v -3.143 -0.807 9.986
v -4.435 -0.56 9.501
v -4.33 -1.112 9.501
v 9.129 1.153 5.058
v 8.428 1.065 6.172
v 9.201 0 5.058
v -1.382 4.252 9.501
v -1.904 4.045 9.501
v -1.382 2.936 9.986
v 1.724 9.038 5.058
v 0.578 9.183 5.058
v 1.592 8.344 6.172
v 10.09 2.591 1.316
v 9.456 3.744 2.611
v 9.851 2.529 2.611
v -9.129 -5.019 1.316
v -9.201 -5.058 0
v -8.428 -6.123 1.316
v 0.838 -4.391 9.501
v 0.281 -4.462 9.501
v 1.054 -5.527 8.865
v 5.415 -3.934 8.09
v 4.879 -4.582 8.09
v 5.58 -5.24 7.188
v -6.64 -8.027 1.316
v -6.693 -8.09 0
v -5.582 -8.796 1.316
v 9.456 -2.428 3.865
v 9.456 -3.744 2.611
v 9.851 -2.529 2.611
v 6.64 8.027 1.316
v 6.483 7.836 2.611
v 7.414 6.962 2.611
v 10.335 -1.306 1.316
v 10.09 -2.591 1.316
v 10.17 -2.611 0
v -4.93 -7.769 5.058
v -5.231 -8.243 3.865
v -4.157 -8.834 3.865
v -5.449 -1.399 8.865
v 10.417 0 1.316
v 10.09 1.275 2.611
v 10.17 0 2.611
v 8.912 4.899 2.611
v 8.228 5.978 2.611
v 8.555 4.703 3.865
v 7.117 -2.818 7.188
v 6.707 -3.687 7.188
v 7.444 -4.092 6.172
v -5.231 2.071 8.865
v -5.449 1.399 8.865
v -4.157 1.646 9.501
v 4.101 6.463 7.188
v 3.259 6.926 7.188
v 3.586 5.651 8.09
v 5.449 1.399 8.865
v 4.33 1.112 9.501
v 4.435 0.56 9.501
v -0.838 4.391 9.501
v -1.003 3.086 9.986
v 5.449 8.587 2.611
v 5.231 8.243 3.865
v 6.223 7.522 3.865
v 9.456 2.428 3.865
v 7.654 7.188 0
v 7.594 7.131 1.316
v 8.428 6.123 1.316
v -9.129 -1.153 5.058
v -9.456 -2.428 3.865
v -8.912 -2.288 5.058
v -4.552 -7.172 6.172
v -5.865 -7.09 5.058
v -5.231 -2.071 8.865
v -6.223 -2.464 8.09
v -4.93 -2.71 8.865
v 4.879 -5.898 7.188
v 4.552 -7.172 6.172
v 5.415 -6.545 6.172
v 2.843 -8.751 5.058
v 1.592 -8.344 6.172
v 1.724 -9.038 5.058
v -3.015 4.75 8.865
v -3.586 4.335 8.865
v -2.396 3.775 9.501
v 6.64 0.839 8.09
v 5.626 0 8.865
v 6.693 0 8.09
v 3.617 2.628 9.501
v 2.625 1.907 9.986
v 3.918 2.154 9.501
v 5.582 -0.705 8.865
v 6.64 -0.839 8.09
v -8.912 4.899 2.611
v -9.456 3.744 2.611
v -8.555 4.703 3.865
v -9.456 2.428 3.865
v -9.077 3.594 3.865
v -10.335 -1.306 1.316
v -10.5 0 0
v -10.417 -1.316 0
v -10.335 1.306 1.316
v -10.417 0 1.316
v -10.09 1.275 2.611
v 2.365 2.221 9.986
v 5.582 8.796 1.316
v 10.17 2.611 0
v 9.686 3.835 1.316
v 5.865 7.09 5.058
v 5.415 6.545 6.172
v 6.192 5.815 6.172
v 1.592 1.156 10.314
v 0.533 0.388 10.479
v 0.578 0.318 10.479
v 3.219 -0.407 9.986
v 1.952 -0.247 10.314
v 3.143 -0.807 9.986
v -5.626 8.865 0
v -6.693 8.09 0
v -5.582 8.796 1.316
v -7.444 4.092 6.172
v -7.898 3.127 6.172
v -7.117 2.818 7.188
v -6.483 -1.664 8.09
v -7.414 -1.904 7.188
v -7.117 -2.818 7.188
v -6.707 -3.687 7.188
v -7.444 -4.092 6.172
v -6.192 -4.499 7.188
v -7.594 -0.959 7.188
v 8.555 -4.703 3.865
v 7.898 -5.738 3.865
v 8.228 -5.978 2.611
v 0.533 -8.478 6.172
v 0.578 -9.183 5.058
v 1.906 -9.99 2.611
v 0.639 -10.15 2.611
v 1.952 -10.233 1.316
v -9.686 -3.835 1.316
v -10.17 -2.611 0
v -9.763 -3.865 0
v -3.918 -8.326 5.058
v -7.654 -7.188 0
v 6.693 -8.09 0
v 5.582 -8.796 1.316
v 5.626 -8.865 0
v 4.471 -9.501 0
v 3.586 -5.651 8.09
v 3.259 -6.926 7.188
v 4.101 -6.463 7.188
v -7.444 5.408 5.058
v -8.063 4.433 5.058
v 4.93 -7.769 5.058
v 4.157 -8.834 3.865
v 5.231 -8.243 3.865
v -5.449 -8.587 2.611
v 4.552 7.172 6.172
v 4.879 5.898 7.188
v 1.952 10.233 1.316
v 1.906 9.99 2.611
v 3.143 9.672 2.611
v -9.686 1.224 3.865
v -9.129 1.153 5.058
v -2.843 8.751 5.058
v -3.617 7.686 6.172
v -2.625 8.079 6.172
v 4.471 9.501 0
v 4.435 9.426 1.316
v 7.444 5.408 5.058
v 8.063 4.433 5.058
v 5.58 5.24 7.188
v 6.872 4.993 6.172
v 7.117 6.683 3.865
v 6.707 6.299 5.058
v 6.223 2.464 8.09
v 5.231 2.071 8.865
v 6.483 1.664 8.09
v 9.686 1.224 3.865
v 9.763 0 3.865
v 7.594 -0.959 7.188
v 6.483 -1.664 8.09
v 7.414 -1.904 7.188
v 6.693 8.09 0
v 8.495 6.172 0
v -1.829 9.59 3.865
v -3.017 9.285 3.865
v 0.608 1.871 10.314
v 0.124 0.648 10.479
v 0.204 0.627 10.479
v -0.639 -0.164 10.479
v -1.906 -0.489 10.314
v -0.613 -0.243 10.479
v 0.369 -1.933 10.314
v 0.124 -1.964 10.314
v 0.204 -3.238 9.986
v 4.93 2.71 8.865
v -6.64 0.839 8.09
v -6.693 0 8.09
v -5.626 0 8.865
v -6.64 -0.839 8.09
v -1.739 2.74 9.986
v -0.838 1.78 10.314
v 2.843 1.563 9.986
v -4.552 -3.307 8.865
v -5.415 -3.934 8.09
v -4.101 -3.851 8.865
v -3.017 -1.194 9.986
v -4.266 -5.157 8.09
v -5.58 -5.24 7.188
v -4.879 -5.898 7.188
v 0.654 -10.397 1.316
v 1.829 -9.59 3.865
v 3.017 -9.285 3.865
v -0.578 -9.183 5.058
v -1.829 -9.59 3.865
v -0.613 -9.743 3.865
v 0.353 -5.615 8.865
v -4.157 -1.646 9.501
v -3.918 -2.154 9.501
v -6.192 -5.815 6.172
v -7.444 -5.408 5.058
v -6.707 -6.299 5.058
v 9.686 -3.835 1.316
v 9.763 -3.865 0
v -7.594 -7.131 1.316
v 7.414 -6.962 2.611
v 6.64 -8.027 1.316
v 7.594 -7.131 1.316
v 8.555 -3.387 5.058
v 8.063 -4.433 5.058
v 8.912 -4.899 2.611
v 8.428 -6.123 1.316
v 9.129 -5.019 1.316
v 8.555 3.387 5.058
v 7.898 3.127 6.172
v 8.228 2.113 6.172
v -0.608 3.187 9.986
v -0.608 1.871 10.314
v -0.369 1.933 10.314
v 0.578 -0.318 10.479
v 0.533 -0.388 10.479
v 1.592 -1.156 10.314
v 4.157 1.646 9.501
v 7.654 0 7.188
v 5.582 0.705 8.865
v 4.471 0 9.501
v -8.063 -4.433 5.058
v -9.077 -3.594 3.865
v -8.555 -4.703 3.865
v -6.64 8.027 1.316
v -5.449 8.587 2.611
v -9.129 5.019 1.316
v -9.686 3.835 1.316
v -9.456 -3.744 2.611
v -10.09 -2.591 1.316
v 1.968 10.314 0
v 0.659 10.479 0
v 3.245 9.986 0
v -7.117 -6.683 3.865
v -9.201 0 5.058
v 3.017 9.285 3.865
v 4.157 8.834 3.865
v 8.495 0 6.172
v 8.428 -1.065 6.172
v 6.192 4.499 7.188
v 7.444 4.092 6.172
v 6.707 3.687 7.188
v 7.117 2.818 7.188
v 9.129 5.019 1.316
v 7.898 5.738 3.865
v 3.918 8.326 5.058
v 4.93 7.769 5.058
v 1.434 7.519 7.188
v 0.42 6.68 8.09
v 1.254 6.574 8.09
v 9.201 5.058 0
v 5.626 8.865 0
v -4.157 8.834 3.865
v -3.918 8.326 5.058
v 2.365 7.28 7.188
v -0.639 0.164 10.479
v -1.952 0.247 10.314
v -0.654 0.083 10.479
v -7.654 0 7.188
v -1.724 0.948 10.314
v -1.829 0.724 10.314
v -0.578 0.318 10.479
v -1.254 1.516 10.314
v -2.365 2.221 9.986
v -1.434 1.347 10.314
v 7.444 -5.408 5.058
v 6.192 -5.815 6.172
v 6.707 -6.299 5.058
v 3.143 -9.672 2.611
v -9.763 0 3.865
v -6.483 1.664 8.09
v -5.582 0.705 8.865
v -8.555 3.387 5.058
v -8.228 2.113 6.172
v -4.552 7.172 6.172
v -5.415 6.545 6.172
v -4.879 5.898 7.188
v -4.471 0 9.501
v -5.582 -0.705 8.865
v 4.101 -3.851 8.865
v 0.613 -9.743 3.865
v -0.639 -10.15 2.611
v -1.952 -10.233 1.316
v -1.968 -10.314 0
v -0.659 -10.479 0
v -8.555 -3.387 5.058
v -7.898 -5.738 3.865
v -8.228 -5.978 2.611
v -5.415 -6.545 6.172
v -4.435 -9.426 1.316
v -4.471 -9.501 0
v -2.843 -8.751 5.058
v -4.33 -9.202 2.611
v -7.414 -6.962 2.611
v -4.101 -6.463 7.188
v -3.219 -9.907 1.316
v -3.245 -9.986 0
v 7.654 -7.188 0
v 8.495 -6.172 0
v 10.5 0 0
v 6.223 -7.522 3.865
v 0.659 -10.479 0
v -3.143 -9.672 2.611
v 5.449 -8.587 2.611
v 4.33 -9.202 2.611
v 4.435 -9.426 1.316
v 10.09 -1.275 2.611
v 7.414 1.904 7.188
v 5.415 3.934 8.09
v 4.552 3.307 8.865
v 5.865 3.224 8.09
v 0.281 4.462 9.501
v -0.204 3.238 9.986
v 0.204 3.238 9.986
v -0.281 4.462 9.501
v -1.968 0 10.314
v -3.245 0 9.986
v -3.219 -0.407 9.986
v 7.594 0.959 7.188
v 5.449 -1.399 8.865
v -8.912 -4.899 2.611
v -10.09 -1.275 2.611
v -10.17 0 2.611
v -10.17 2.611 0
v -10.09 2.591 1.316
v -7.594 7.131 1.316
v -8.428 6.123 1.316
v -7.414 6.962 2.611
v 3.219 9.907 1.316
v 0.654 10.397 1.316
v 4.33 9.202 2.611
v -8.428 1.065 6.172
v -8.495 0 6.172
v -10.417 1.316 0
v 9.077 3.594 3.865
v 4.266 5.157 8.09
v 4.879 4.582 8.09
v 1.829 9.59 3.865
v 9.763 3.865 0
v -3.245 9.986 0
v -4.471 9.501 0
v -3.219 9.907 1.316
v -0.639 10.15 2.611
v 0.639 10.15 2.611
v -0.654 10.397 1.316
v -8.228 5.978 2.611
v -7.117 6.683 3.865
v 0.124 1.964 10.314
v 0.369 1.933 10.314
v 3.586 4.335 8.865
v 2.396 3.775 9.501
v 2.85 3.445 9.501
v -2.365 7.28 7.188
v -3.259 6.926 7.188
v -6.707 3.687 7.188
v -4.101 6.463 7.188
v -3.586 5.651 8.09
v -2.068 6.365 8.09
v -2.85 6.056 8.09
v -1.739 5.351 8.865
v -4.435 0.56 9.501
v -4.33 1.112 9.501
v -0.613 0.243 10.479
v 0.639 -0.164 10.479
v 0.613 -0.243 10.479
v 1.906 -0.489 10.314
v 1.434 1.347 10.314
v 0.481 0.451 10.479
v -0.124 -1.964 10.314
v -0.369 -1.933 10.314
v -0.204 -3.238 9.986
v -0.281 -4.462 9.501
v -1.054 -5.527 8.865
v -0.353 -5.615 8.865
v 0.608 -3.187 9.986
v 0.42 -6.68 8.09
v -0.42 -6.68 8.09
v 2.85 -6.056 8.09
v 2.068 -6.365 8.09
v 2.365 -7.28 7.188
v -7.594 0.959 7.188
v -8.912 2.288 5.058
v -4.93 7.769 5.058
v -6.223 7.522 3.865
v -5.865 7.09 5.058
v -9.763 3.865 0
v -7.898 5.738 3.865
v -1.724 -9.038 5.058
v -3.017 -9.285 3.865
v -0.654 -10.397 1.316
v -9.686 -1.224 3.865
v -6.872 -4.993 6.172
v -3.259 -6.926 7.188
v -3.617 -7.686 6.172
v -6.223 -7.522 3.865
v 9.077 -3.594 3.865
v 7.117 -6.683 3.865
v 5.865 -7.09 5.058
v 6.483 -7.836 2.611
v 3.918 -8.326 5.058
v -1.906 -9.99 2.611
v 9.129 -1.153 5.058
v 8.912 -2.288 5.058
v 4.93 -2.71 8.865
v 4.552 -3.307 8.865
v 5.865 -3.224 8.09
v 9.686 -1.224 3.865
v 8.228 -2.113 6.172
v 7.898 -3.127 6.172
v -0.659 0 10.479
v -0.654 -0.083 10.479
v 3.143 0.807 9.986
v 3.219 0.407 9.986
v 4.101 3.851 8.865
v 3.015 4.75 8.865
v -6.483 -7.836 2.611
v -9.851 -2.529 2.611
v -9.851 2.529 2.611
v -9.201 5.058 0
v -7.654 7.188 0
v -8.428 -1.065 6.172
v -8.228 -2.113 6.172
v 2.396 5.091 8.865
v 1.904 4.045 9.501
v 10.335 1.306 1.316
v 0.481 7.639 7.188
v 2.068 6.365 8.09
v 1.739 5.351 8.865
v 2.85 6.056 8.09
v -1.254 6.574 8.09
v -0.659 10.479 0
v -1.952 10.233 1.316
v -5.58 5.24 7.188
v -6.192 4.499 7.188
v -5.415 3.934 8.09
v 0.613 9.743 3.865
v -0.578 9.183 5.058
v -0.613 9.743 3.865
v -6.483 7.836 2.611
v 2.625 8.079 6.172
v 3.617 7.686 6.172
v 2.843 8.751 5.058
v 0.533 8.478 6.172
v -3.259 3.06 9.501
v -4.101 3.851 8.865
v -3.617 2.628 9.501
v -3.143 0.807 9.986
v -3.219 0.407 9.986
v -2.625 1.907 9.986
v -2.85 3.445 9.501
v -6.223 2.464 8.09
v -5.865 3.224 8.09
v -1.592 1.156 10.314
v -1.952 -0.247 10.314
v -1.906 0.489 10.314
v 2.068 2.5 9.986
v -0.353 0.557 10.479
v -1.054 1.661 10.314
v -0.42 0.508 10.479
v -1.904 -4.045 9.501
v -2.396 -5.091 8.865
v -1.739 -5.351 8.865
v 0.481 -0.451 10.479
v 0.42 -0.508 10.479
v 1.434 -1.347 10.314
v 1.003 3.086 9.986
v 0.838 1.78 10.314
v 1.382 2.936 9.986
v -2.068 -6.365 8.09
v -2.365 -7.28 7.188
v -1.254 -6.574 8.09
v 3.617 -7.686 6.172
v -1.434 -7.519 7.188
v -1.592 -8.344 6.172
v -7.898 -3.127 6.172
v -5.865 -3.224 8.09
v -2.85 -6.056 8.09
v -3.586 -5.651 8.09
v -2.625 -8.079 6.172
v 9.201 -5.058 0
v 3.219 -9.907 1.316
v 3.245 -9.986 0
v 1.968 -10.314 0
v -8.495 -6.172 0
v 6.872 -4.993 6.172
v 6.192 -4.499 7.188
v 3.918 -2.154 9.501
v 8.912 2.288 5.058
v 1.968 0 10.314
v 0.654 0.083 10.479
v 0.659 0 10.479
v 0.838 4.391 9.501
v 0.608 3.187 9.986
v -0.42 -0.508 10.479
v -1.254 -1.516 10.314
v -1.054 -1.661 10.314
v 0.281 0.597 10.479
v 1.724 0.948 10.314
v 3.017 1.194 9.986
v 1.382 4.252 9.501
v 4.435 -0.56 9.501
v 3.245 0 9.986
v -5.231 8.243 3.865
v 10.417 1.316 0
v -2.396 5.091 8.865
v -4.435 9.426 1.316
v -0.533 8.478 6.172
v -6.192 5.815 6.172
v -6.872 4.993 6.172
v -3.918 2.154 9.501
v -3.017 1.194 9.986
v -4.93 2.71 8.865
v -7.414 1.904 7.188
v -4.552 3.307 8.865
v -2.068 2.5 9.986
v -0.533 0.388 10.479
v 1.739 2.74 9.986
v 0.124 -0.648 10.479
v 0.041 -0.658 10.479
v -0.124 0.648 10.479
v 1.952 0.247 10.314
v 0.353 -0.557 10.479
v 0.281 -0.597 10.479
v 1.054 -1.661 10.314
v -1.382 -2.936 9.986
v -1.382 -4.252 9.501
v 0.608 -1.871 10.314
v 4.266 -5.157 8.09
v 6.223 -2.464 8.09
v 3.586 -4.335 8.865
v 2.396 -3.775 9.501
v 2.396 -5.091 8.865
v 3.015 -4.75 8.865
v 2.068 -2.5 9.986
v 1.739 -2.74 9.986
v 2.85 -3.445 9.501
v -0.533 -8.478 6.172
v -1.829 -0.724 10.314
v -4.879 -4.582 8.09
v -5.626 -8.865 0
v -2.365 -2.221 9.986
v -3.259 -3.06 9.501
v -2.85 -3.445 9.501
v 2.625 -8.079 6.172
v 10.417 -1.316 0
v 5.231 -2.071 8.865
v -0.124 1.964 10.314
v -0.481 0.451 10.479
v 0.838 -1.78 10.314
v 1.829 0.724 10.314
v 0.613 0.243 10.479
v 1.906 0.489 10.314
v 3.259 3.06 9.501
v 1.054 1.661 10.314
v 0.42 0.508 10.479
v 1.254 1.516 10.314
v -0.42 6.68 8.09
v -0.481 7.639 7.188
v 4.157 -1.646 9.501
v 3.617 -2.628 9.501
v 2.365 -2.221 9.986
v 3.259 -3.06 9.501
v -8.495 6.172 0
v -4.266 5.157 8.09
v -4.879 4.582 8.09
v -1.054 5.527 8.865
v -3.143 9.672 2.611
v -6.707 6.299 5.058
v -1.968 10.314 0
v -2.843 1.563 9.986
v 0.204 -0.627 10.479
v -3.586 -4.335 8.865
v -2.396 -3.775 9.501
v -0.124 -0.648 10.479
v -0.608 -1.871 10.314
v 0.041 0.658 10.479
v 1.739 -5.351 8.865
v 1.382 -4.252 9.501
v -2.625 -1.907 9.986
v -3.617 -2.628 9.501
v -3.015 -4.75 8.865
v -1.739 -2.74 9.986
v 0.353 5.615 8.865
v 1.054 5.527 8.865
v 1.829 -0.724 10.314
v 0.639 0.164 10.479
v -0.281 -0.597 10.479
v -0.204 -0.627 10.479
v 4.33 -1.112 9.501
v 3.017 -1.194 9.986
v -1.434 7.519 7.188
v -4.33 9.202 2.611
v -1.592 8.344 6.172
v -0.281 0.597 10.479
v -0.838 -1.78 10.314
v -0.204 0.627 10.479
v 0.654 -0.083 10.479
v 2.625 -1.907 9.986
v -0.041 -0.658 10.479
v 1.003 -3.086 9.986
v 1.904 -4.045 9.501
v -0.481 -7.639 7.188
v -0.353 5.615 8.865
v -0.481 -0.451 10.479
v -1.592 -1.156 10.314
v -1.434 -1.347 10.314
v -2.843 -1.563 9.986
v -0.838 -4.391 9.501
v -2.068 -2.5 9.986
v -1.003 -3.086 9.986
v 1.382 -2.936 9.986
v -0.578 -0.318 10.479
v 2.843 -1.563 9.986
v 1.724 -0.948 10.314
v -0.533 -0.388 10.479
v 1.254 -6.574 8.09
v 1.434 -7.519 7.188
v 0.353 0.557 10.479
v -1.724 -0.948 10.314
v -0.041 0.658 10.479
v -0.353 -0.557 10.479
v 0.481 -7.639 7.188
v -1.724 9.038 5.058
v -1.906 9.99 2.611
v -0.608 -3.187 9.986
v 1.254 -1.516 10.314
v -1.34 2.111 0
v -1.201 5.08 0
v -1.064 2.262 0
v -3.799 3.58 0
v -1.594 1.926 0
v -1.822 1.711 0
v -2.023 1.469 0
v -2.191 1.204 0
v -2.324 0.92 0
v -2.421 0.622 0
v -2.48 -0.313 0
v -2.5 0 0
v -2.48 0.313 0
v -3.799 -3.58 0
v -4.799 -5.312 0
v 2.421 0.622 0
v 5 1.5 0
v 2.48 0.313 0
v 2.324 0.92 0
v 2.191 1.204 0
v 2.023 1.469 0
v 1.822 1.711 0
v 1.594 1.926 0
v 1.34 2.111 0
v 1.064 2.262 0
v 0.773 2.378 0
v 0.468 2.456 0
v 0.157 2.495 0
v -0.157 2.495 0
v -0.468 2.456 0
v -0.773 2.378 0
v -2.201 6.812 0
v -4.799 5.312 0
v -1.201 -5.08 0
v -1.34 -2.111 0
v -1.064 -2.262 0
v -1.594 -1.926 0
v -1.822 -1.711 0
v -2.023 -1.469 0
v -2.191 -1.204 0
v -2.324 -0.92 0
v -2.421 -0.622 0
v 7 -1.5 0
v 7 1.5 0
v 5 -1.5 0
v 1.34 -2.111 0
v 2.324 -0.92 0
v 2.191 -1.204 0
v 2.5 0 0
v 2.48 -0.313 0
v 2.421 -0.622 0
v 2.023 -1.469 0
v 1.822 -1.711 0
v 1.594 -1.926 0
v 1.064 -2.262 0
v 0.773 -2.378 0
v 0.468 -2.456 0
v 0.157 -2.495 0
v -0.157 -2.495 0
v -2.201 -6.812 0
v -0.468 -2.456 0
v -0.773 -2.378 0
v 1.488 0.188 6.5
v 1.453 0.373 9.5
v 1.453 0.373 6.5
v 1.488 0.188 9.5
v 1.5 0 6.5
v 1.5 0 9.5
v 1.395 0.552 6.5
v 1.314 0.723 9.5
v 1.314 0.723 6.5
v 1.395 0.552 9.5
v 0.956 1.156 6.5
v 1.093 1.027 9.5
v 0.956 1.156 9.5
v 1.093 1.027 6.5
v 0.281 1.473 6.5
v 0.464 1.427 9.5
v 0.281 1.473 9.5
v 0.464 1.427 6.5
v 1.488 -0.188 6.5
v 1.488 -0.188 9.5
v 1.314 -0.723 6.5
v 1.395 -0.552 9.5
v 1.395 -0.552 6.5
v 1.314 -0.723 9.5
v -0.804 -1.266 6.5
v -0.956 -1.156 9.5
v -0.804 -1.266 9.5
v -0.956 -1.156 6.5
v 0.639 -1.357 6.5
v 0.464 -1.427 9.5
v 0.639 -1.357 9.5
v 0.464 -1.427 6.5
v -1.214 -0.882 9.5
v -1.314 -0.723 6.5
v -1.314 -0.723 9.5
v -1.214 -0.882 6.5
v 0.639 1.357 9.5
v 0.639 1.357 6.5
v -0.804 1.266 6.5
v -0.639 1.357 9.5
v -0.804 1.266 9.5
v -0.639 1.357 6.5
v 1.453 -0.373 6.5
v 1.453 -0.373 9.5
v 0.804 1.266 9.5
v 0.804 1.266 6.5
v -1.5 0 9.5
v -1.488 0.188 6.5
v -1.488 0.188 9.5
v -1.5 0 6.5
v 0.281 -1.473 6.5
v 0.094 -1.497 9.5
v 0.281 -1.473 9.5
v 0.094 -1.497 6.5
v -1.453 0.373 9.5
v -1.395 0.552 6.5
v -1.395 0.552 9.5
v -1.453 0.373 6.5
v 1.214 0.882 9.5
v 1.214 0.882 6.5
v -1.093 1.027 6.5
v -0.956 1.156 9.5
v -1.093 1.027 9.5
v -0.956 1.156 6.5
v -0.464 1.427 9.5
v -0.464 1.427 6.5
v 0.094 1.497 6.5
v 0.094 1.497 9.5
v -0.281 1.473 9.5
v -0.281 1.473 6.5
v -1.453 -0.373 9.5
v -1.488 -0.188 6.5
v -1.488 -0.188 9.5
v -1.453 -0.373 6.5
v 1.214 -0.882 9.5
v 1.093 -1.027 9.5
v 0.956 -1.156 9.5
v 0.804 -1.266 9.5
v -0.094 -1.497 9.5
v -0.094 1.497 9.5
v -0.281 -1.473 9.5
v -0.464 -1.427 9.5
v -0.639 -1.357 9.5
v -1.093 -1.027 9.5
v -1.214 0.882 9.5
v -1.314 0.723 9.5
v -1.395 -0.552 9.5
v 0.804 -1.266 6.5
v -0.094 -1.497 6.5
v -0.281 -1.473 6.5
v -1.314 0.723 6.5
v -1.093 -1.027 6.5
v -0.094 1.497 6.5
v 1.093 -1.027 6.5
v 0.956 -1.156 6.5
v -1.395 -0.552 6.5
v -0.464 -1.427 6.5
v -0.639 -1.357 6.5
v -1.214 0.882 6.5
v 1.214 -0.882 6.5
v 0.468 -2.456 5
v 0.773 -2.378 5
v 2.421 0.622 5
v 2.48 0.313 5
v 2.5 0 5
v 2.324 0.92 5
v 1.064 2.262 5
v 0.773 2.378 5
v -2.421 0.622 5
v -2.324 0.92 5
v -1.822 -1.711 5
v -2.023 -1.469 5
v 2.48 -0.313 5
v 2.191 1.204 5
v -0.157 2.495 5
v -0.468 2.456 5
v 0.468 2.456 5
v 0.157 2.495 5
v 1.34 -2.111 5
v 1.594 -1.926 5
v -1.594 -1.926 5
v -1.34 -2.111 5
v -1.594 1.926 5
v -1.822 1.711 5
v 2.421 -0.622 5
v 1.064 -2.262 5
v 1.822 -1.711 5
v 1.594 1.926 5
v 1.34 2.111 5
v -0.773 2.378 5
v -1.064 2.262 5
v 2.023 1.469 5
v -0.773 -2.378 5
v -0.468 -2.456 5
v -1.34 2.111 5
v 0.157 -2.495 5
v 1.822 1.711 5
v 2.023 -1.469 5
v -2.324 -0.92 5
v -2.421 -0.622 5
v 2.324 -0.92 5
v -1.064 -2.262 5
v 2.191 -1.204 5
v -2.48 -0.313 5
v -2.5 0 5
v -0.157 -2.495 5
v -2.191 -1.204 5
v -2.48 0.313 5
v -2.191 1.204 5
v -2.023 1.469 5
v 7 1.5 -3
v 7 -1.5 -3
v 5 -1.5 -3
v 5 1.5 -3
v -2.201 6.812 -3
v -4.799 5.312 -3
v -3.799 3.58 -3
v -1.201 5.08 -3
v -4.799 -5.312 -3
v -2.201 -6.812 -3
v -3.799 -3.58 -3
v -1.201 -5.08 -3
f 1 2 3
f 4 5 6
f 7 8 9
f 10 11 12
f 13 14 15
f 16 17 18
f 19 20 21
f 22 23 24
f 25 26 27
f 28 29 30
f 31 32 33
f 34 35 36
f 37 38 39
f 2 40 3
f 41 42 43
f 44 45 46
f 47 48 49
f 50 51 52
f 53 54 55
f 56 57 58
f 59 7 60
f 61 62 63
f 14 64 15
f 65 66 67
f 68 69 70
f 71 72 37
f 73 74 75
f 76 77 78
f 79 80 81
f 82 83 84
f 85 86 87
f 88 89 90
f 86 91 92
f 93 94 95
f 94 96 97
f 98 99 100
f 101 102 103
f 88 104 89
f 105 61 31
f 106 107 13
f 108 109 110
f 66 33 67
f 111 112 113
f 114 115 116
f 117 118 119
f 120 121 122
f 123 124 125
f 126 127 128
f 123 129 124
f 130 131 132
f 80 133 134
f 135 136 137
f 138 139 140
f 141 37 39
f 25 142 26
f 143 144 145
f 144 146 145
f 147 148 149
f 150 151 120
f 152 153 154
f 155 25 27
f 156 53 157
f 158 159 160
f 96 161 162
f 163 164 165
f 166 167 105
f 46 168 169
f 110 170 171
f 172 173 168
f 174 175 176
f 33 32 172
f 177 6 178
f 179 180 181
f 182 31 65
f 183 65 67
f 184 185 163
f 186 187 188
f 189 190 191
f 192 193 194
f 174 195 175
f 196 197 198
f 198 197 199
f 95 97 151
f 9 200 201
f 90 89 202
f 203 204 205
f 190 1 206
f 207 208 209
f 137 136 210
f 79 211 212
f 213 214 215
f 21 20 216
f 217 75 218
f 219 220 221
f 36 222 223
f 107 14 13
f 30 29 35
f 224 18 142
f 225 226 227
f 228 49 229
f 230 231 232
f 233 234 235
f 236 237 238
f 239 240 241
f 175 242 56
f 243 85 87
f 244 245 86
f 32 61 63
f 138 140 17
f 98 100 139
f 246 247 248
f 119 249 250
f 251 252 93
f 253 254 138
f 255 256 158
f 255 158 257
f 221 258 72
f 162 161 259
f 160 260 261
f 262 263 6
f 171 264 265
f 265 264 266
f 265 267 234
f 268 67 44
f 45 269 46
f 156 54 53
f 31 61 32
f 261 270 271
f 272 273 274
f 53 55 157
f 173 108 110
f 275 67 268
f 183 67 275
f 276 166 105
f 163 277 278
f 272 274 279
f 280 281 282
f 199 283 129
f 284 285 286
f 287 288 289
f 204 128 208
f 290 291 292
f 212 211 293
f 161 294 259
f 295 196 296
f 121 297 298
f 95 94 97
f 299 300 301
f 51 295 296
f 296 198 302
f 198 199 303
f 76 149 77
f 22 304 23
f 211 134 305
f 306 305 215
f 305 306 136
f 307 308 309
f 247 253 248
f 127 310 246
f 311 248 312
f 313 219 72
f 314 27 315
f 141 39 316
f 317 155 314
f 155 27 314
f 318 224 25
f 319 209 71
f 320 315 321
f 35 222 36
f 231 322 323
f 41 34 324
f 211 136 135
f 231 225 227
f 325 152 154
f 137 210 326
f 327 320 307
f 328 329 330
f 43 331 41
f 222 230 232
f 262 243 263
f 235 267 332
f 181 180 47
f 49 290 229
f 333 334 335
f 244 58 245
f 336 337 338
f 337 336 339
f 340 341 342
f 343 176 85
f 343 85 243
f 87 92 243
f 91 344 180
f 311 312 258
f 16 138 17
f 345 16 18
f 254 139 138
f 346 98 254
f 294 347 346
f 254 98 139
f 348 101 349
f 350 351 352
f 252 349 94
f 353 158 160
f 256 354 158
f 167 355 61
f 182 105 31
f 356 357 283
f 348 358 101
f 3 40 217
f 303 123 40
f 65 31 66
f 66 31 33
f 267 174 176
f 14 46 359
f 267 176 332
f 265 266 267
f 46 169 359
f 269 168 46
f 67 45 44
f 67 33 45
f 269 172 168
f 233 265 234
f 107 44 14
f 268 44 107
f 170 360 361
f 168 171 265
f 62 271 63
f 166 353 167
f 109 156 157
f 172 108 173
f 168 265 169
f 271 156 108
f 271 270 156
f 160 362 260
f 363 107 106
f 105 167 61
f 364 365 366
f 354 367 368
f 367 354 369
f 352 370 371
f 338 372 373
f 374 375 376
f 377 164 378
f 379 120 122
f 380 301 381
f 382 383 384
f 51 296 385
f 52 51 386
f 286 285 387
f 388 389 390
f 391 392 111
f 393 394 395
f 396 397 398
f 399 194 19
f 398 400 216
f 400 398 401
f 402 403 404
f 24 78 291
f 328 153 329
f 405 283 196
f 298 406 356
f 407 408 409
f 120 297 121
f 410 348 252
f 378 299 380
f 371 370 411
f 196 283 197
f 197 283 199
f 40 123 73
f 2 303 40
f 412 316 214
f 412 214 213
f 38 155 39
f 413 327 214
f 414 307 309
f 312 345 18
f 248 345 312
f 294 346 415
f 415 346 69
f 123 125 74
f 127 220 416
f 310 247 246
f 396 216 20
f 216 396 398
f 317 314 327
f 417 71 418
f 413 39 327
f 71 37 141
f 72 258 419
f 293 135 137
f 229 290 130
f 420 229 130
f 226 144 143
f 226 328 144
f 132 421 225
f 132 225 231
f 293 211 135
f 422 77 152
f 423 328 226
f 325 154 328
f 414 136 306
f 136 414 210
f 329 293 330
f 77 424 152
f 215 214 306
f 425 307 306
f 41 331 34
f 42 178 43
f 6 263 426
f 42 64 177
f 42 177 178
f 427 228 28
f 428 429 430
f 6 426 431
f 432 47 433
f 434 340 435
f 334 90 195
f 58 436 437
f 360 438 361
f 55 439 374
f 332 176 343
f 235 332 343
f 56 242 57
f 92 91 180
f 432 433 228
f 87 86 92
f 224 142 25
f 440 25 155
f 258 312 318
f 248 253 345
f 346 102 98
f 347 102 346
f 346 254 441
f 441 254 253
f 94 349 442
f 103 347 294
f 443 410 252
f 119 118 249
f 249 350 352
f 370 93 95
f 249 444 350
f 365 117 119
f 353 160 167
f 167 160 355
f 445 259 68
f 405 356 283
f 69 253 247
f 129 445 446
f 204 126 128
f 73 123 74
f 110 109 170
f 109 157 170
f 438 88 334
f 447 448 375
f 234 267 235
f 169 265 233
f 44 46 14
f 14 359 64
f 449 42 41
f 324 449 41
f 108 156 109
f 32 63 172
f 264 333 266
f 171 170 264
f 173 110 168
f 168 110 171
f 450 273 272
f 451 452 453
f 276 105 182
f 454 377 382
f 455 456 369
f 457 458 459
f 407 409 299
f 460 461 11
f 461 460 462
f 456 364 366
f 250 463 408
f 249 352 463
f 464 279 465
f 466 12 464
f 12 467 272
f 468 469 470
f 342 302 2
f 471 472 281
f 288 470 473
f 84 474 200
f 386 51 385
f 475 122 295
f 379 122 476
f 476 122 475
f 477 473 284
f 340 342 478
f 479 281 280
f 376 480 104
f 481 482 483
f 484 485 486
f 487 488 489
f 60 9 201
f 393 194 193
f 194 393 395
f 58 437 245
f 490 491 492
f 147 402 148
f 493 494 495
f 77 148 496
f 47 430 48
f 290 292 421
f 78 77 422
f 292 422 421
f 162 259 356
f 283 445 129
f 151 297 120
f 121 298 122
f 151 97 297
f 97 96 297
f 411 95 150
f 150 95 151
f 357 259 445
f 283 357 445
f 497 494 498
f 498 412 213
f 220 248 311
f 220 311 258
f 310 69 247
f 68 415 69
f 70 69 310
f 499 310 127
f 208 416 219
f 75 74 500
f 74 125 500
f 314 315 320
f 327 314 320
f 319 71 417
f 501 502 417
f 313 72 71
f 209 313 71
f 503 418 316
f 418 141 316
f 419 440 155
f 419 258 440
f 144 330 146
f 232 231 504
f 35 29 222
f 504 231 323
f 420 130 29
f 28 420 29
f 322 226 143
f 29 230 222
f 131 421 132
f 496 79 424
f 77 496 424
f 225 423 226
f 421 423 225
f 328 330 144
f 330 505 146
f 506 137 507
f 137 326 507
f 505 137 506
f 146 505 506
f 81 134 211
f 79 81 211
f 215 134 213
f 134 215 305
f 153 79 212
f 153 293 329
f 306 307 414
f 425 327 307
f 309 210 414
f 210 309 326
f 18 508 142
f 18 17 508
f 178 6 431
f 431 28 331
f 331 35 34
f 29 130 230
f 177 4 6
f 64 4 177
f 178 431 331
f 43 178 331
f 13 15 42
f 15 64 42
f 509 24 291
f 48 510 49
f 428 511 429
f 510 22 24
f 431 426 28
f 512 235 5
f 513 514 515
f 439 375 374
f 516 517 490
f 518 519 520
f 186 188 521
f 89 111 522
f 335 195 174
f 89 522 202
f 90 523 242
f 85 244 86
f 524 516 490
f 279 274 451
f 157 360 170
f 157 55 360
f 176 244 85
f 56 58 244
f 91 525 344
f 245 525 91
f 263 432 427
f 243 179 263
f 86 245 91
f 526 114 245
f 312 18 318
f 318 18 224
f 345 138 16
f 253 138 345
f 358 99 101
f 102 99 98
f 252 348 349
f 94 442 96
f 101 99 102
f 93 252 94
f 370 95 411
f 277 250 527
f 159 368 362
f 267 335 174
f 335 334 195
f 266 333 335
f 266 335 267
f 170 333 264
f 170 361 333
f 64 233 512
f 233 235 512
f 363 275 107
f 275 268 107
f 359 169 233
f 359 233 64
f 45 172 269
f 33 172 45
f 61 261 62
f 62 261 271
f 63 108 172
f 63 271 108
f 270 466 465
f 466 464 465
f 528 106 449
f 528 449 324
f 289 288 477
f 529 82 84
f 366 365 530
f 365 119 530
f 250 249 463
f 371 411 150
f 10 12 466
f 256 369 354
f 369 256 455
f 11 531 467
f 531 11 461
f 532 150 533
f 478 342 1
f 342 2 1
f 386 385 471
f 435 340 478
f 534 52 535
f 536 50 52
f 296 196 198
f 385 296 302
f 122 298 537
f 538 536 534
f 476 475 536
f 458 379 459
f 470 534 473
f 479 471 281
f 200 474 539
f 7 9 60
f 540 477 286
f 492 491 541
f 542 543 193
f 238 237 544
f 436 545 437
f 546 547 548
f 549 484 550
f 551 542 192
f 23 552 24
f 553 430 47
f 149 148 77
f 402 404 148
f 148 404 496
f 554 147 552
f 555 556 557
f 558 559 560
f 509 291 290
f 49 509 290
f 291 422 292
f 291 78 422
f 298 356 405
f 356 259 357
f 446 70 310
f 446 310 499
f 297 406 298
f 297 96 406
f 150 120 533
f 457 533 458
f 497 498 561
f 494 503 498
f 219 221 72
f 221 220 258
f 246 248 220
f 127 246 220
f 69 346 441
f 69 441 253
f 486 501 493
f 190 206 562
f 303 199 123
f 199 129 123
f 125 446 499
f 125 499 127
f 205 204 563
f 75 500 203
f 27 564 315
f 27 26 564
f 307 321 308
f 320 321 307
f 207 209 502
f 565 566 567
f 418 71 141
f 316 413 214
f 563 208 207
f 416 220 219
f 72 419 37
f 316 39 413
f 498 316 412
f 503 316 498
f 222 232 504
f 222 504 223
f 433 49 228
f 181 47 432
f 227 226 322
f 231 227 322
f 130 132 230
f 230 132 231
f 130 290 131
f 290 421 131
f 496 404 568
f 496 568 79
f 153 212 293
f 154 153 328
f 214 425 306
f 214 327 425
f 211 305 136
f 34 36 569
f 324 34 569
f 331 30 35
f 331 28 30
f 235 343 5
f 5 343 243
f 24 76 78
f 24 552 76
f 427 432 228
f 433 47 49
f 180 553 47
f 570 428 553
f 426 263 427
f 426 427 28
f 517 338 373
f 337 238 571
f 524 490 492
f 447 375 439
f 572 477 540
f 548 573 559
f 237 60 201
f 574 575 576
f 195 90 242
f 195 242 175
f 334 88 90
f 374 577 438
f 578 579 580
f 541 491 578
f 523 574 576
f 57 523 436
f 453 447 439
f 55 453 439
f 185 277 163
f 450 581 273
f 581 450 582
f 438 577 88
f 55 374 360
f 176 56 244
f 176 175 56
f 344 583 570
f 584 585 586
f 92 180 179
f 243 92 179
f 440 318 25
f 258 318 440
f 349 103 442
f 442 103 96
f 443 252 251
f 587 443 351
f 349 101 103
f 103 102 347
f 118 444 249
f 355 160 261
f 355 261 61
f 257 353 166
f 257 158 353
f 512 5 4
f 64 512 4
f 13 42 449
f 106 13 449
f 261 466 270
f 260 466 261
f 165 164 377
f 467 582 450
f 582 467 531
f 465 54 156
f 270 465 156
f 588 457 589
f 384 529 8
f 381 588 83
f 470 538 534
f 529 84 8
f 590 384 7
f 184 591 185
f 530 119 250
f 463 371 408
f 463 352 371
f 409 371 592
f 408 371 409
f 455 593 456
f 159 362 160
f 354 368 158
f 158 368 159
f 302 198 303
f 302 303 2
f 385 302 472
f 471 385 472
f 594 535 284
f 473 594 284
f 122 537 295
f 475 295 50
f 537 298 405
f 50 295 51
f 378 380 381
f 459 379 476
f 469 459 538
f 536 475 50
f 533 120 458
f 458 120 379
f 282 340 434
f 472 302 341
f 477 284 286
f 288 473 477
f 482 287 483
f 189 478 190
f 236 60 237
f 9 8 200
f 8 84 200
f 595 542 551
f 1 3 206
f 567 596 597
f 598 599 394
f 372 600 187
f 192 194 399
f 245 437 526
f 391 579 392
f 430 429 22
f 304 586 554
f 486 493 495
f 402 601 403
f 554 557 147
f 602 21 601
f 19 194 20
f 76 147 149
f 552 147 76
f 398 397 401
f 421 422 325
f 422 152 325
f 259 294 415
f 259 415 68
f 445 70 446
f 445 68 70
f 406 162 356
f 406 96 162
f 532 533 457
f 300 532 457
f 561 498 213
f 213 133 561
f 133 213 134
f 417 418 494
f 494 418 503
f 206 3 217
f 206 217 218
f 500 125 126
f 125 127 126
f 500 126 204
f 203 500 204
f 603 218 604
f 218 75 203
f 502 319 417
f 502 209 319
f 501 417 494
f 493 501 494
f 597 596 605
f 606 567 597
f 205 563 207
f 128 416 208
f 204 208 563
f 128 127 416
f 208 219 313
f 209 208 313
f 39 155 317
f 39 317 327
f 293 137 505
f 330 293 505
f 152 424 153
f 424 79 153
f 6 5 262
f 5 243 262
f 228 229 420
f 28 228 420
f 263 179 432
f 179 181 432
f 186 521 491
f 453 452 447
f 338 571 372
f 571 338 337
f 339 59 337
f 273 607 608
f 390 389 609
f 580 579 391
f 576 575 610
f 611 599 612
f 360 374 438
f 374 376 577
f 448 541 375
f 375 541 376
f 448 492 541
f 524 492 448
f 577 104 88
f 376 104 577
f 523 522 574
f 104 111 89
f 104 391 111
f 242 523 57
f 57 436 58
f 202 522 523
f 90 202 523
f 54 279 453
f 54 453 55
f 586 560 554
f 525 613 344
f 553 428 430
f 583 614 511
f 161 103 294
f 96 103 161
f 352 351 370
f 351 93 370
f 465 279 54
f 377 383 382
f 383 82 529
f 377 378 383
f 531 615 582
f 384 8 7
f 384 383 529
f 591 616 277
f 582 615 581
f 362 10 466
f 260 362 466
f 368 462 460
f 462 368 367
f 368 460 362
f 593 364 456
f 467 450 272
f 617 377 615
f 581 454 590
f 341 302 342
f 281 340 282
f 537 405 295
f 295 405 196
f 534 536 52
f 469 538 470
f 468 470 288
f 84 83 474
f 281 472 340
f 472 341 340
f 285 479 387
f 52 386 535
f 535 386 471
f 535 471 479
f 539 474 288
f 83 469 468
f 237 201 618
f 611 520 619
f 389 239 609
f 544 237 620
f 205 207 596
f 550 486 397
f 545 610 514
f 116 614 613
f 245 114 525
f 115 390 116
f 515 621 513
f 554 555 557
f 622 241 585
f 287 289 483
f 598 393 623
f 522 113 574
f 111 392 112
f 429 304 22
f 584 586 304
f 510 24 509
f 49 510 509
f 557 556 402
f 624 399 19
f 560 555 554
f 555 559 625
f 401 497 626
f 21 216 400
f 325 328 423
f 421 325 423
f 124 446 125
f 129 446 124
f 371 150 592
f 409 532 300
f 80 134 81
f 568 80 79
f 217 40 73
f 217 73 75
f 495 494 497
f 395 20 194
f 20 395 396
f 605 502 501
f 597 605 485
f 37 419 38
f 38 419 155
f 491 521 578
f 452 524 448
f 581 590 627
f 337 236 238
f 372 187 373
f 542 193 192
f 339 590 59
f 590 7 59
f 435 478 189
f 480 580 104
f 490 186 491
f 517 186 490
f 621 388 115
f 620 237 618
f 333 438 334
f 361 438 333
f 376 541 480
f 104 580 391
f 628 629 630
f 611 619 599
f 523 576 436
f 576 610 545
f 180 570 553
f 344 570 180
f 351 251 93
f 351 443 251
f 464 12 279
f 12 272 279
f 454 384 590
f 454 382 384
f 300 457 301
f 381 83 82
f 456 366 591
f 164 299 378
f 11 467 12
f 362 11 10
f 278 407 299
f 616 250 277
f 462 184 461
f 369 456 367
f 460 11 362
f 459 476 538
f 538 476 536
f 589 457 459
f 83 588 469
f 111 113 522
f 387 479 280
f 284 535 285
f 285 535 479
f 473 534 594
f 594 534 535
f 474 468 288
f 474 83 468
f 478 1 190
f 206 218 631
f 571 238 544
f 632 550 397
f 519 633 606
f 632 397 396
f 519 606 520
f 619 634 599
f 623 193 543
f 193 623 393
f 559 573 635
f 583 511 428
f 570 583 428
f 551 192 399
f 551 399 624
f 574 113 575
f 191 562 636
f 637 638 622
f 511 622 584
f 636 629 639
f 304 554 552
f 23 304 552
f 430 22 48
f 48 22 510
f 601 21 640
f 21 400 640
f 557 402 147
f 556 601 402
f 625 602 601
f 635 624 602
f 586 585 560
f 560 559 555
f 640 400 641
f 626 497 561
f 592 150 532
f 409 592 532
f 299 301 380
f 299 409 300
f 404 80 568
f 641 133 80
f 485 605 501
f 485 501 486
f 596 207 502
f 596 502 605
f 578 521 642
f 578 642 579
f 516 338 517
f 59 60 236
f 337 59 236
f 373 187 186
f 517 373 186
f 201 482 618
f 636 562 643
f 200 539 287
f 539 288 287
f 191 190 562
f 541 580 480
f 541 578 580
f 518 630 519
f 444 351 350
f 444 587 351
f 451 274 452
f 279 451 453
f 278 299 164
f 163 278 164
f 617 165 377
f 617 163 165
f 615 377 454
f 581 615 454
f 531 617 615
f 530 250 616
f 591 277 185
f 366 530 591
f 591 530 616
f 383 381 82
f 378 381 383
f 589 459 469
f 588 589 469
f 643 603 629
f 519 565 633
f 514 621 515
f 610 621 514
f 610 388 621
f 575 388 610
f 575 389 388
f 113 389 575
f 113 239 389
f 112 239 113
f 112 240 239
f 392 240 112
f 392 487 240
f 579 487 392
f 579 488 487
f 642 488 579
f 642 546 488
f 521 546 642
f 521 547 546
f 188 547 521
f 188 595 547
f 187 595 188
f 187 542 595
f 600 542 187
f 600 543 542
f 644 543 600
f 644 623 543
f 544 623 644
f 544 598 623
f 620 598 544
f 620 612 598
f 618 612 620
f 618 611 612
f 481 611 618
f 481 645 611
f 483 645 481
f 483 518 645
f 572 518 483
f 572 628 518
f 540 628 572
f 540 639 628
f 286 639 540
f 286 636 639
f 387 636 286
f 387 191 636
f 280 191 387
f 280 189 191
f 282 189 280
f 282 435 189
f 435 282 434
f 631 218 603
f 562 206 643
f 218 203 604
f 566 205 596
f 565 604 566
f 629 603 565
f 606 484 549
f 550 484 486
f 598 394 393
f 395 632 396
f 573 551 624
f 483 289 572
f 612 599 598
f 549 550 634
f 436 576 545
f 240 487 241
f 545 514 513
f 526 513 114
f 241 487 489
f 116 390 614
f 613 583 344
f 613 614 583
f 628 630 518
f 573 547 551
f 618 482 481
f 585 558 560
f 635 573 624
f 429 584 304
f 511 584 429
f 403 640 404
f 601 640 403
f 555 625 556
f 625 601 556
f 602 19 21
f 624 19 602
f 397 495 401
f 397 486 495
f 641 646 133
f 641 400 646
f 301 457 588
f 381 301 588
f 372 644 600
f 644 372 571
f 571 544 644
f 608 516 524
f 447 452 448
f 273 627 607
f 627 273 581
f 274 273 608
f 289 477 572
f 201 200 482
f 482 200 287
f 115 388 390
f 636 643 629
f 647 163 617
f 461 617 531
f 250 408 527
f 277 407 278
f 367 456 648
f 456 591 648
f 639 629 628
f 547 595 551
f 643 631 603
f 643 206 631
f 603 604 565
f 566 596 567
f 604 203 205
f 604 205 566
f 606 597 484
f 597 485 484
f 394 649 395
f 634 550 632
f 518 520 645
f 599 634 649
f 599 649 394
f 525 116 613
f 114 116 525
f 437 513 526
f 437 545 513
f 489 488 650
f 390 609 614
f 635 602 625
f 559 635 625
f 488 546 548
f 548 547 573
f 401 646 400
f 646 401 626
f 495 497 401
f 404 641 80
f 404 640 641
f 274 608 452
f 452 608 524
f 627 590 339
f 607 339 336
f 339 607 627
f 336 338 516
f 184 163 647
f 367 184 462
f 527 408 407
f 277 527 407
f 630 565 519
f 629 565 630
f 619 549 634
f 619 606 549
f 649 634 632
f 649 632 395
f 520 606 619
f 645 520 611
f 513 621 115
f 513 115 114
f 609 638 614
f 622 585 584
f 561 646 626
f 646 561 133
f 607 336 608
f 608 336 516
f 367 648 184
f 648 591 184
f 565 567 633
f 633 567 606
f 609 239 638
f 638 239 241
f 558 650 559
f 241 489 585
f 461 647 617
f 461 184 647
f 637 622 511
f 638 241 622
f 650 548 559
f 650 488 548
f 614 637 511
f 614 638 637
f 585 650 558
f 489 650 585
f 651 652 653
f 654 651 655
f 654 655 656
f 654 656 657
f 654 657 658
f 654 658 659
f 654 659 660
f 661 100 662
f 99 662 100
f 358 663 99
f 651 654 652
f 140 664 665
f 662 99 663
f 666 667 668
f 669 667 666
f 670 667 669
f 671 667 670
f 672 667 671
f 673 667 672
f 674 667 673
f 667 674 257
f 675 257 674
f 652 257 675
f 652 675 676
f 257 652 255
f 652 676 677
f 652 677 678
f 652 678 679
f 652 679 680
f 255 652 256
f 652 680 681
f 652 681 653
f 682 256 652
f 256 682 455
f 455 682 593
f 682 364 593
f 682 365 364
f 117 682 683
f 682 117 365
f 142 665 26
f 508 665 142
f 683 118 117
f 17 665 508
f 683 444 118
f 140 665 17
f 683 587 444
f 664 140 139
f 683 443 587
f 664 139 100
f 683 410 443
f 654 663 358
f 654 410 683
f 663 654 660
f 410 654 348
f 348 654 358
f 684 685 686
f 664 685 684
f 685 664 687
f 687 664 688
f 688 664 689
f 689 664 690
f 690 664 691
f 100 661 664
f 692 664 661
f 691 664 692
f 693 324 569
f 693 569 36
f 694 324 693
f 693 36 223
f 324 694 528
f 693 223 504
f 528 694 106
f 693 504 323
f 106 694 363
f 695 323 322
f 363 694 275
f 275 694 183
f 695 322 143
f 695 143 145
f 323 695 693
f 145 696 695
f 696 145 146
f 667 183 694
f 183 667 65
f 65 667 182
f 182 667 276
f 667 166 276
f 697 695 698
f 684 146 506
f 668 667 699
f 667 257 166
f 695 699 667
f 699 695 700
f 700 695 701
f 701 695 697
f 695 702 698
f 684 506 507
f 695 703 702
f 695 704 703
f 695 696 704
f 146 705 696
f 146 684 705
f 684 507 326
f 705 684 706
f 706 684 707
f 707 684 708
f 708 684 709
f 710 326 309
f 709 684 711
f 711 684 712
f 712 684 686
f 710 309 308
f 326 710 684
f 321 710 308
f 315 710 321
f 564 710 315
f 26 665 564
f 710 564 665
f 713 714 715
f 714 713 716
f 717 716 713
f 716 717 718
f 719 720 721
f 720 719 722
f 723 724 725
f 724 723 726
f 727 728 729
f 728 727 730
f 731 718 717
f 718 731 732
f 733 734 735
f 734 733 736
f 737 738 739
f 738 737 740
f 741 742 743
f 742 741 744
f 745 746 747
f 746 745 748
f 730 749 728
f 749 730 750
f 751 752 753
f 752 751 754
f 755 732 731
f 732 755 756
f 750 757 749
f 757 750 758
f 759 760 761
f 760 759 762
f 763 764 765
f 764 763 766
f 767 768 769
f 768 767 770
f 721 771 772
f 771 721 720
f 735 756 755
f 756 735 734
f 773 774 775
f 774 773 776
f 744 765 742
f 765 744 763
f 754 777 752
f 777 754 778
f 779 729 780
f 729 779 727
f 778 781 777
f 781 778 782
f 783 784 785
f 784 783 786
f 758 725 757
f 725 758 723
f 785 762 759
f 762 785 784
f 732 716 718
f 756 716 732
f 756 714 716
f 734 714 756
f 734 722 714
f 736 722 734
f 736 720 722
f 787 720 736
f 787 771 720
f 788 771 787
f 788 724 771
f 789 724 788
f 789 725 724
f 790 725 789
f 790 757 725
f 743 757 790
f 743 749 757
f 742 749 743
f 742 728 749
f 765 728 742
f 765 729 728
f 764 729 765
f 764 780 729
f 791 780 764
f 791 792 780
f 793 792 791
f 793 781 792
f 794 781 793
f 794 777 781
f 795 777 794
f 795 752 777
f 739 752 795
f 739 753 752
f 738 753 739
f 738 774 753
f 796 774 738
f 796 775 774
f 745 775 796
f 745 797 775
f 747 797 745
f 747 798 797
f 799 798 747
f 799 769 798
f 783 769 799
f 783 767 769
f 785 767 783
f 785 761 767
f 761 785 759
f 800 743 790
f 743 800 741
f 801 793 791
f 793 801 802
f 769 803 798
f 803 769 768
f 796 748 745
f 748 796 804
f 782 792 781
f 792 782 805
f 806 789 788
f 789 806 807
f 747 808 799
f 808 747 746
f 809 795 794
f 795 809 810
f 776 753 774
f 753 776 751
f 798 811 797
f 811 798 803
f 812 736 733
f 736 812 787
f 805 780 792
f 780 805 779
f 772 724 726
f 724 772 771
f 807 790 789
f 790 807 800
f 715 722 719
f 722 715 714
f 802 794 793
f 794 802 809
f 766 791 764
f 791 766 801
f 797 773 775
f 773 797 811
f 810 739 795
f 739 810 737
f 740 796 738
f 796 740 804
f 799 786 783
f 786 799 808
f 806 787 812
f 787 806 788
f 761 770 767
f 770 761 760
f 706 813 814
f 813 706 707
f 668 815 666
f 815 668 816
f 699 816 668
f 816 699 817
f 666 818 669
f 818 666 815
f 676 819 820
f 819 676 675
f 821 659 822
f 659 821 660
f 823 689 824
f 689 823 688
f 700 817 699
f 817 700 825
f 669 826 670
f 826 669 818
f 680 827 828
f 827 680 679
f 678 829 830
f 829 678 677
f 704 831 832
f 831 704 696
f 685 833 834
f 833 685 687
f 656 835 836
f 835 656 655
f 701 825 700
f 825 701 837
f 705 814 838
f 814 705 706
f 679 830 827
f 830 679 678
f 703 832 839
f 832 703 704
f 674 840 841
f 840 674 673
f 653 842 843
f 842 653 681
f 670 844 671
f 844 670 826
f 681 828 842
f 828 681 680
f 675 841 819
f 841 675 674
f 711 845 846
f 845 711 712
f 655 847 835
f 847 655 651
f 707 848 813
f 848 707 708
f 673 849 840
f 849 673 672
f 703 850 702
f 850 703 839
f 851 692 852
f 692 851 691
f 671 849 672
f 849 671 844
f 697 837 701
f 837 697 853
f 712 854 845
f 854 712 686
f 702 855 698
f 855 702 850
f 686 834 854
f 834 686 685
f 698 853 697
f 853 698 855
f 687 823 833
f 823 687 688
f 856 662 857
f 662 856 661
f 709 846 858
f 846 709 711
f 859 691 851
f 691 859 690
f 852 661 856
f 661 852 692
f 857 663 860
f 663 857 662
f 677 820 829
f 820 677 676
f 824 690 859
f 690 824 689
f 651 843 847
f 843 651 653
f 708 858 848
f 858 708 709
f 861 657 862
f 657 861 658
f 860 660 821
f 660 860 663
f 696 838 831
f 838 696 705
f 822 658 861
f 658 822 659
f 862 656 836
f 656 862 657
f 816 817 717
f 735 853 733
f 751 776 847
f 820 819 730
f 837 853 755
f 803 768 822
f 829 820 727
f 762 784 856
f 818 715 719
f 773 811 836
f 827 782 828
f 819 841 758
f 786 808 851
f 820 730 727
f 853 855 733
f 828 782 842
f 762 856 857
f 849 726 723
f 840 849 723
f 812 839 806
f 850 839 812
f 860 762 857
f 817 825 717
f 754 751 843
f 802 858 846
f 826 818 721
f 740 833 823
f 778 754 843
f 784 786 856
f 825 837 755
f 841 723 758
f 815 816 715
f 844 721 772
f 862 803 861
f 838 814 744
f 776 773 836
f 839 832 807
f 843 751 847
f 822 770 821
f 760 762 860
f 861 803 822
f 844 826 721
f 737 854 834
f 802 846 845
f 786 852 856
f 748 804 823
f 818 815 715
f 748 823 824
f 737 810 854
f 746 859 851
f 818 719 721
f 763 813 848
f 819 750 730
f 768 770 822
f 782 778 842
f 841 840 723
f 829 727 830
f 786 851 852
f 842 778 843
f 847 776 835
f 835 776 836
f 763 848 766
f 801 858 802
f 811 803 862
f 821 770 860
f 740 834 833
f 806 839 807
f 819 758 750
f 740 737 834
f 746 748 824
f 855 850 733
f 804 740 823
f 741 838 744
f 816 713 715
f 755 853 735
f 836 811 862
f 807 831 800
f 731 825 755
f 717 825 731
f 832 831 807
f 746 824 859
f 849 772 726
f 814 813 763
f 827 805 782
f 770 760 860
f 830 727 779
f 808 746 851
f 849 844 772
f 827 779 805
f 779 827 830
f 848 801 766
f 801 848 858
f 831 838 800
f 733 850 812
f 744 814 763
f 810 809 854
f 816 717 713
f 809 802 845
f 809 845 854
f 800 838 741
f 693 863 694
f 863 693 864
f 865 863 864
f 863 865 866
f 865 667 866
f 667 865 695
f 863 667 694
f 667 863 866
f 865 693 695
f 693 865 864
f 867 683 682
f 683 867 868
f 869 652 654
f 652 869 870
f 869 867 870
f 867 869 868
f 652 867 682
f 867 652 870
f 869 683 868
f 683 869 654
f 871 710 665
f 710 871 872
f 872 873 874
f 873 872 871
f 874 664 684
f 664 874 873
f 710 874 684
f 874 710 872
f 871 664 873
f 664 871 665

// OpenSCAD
$fn = 50;


difference() {
    difference() {
        sphere(d=21);
        translate([0,0,-10.5]) cube(21, center=true);
    }
    union() {
        cylinder(h=9.5, d=3);
        cylinder(h=5, d=5);
        translate([0,0,5]) cylinder(h=1.5, d1=5, d2=3);
    }
}


for(i = [0:120:360]) {
    rotate(i) translate([5,-1.5,-3]) cube(size=[2,3,5]);
}
/*
    union() {
        cylinder(h=9.5, d=3);
        cylinder(h=5, d=5);
        translate([0,0,5]) cylinder(h=1.5, d1=5, d2=3);
    }
*/
